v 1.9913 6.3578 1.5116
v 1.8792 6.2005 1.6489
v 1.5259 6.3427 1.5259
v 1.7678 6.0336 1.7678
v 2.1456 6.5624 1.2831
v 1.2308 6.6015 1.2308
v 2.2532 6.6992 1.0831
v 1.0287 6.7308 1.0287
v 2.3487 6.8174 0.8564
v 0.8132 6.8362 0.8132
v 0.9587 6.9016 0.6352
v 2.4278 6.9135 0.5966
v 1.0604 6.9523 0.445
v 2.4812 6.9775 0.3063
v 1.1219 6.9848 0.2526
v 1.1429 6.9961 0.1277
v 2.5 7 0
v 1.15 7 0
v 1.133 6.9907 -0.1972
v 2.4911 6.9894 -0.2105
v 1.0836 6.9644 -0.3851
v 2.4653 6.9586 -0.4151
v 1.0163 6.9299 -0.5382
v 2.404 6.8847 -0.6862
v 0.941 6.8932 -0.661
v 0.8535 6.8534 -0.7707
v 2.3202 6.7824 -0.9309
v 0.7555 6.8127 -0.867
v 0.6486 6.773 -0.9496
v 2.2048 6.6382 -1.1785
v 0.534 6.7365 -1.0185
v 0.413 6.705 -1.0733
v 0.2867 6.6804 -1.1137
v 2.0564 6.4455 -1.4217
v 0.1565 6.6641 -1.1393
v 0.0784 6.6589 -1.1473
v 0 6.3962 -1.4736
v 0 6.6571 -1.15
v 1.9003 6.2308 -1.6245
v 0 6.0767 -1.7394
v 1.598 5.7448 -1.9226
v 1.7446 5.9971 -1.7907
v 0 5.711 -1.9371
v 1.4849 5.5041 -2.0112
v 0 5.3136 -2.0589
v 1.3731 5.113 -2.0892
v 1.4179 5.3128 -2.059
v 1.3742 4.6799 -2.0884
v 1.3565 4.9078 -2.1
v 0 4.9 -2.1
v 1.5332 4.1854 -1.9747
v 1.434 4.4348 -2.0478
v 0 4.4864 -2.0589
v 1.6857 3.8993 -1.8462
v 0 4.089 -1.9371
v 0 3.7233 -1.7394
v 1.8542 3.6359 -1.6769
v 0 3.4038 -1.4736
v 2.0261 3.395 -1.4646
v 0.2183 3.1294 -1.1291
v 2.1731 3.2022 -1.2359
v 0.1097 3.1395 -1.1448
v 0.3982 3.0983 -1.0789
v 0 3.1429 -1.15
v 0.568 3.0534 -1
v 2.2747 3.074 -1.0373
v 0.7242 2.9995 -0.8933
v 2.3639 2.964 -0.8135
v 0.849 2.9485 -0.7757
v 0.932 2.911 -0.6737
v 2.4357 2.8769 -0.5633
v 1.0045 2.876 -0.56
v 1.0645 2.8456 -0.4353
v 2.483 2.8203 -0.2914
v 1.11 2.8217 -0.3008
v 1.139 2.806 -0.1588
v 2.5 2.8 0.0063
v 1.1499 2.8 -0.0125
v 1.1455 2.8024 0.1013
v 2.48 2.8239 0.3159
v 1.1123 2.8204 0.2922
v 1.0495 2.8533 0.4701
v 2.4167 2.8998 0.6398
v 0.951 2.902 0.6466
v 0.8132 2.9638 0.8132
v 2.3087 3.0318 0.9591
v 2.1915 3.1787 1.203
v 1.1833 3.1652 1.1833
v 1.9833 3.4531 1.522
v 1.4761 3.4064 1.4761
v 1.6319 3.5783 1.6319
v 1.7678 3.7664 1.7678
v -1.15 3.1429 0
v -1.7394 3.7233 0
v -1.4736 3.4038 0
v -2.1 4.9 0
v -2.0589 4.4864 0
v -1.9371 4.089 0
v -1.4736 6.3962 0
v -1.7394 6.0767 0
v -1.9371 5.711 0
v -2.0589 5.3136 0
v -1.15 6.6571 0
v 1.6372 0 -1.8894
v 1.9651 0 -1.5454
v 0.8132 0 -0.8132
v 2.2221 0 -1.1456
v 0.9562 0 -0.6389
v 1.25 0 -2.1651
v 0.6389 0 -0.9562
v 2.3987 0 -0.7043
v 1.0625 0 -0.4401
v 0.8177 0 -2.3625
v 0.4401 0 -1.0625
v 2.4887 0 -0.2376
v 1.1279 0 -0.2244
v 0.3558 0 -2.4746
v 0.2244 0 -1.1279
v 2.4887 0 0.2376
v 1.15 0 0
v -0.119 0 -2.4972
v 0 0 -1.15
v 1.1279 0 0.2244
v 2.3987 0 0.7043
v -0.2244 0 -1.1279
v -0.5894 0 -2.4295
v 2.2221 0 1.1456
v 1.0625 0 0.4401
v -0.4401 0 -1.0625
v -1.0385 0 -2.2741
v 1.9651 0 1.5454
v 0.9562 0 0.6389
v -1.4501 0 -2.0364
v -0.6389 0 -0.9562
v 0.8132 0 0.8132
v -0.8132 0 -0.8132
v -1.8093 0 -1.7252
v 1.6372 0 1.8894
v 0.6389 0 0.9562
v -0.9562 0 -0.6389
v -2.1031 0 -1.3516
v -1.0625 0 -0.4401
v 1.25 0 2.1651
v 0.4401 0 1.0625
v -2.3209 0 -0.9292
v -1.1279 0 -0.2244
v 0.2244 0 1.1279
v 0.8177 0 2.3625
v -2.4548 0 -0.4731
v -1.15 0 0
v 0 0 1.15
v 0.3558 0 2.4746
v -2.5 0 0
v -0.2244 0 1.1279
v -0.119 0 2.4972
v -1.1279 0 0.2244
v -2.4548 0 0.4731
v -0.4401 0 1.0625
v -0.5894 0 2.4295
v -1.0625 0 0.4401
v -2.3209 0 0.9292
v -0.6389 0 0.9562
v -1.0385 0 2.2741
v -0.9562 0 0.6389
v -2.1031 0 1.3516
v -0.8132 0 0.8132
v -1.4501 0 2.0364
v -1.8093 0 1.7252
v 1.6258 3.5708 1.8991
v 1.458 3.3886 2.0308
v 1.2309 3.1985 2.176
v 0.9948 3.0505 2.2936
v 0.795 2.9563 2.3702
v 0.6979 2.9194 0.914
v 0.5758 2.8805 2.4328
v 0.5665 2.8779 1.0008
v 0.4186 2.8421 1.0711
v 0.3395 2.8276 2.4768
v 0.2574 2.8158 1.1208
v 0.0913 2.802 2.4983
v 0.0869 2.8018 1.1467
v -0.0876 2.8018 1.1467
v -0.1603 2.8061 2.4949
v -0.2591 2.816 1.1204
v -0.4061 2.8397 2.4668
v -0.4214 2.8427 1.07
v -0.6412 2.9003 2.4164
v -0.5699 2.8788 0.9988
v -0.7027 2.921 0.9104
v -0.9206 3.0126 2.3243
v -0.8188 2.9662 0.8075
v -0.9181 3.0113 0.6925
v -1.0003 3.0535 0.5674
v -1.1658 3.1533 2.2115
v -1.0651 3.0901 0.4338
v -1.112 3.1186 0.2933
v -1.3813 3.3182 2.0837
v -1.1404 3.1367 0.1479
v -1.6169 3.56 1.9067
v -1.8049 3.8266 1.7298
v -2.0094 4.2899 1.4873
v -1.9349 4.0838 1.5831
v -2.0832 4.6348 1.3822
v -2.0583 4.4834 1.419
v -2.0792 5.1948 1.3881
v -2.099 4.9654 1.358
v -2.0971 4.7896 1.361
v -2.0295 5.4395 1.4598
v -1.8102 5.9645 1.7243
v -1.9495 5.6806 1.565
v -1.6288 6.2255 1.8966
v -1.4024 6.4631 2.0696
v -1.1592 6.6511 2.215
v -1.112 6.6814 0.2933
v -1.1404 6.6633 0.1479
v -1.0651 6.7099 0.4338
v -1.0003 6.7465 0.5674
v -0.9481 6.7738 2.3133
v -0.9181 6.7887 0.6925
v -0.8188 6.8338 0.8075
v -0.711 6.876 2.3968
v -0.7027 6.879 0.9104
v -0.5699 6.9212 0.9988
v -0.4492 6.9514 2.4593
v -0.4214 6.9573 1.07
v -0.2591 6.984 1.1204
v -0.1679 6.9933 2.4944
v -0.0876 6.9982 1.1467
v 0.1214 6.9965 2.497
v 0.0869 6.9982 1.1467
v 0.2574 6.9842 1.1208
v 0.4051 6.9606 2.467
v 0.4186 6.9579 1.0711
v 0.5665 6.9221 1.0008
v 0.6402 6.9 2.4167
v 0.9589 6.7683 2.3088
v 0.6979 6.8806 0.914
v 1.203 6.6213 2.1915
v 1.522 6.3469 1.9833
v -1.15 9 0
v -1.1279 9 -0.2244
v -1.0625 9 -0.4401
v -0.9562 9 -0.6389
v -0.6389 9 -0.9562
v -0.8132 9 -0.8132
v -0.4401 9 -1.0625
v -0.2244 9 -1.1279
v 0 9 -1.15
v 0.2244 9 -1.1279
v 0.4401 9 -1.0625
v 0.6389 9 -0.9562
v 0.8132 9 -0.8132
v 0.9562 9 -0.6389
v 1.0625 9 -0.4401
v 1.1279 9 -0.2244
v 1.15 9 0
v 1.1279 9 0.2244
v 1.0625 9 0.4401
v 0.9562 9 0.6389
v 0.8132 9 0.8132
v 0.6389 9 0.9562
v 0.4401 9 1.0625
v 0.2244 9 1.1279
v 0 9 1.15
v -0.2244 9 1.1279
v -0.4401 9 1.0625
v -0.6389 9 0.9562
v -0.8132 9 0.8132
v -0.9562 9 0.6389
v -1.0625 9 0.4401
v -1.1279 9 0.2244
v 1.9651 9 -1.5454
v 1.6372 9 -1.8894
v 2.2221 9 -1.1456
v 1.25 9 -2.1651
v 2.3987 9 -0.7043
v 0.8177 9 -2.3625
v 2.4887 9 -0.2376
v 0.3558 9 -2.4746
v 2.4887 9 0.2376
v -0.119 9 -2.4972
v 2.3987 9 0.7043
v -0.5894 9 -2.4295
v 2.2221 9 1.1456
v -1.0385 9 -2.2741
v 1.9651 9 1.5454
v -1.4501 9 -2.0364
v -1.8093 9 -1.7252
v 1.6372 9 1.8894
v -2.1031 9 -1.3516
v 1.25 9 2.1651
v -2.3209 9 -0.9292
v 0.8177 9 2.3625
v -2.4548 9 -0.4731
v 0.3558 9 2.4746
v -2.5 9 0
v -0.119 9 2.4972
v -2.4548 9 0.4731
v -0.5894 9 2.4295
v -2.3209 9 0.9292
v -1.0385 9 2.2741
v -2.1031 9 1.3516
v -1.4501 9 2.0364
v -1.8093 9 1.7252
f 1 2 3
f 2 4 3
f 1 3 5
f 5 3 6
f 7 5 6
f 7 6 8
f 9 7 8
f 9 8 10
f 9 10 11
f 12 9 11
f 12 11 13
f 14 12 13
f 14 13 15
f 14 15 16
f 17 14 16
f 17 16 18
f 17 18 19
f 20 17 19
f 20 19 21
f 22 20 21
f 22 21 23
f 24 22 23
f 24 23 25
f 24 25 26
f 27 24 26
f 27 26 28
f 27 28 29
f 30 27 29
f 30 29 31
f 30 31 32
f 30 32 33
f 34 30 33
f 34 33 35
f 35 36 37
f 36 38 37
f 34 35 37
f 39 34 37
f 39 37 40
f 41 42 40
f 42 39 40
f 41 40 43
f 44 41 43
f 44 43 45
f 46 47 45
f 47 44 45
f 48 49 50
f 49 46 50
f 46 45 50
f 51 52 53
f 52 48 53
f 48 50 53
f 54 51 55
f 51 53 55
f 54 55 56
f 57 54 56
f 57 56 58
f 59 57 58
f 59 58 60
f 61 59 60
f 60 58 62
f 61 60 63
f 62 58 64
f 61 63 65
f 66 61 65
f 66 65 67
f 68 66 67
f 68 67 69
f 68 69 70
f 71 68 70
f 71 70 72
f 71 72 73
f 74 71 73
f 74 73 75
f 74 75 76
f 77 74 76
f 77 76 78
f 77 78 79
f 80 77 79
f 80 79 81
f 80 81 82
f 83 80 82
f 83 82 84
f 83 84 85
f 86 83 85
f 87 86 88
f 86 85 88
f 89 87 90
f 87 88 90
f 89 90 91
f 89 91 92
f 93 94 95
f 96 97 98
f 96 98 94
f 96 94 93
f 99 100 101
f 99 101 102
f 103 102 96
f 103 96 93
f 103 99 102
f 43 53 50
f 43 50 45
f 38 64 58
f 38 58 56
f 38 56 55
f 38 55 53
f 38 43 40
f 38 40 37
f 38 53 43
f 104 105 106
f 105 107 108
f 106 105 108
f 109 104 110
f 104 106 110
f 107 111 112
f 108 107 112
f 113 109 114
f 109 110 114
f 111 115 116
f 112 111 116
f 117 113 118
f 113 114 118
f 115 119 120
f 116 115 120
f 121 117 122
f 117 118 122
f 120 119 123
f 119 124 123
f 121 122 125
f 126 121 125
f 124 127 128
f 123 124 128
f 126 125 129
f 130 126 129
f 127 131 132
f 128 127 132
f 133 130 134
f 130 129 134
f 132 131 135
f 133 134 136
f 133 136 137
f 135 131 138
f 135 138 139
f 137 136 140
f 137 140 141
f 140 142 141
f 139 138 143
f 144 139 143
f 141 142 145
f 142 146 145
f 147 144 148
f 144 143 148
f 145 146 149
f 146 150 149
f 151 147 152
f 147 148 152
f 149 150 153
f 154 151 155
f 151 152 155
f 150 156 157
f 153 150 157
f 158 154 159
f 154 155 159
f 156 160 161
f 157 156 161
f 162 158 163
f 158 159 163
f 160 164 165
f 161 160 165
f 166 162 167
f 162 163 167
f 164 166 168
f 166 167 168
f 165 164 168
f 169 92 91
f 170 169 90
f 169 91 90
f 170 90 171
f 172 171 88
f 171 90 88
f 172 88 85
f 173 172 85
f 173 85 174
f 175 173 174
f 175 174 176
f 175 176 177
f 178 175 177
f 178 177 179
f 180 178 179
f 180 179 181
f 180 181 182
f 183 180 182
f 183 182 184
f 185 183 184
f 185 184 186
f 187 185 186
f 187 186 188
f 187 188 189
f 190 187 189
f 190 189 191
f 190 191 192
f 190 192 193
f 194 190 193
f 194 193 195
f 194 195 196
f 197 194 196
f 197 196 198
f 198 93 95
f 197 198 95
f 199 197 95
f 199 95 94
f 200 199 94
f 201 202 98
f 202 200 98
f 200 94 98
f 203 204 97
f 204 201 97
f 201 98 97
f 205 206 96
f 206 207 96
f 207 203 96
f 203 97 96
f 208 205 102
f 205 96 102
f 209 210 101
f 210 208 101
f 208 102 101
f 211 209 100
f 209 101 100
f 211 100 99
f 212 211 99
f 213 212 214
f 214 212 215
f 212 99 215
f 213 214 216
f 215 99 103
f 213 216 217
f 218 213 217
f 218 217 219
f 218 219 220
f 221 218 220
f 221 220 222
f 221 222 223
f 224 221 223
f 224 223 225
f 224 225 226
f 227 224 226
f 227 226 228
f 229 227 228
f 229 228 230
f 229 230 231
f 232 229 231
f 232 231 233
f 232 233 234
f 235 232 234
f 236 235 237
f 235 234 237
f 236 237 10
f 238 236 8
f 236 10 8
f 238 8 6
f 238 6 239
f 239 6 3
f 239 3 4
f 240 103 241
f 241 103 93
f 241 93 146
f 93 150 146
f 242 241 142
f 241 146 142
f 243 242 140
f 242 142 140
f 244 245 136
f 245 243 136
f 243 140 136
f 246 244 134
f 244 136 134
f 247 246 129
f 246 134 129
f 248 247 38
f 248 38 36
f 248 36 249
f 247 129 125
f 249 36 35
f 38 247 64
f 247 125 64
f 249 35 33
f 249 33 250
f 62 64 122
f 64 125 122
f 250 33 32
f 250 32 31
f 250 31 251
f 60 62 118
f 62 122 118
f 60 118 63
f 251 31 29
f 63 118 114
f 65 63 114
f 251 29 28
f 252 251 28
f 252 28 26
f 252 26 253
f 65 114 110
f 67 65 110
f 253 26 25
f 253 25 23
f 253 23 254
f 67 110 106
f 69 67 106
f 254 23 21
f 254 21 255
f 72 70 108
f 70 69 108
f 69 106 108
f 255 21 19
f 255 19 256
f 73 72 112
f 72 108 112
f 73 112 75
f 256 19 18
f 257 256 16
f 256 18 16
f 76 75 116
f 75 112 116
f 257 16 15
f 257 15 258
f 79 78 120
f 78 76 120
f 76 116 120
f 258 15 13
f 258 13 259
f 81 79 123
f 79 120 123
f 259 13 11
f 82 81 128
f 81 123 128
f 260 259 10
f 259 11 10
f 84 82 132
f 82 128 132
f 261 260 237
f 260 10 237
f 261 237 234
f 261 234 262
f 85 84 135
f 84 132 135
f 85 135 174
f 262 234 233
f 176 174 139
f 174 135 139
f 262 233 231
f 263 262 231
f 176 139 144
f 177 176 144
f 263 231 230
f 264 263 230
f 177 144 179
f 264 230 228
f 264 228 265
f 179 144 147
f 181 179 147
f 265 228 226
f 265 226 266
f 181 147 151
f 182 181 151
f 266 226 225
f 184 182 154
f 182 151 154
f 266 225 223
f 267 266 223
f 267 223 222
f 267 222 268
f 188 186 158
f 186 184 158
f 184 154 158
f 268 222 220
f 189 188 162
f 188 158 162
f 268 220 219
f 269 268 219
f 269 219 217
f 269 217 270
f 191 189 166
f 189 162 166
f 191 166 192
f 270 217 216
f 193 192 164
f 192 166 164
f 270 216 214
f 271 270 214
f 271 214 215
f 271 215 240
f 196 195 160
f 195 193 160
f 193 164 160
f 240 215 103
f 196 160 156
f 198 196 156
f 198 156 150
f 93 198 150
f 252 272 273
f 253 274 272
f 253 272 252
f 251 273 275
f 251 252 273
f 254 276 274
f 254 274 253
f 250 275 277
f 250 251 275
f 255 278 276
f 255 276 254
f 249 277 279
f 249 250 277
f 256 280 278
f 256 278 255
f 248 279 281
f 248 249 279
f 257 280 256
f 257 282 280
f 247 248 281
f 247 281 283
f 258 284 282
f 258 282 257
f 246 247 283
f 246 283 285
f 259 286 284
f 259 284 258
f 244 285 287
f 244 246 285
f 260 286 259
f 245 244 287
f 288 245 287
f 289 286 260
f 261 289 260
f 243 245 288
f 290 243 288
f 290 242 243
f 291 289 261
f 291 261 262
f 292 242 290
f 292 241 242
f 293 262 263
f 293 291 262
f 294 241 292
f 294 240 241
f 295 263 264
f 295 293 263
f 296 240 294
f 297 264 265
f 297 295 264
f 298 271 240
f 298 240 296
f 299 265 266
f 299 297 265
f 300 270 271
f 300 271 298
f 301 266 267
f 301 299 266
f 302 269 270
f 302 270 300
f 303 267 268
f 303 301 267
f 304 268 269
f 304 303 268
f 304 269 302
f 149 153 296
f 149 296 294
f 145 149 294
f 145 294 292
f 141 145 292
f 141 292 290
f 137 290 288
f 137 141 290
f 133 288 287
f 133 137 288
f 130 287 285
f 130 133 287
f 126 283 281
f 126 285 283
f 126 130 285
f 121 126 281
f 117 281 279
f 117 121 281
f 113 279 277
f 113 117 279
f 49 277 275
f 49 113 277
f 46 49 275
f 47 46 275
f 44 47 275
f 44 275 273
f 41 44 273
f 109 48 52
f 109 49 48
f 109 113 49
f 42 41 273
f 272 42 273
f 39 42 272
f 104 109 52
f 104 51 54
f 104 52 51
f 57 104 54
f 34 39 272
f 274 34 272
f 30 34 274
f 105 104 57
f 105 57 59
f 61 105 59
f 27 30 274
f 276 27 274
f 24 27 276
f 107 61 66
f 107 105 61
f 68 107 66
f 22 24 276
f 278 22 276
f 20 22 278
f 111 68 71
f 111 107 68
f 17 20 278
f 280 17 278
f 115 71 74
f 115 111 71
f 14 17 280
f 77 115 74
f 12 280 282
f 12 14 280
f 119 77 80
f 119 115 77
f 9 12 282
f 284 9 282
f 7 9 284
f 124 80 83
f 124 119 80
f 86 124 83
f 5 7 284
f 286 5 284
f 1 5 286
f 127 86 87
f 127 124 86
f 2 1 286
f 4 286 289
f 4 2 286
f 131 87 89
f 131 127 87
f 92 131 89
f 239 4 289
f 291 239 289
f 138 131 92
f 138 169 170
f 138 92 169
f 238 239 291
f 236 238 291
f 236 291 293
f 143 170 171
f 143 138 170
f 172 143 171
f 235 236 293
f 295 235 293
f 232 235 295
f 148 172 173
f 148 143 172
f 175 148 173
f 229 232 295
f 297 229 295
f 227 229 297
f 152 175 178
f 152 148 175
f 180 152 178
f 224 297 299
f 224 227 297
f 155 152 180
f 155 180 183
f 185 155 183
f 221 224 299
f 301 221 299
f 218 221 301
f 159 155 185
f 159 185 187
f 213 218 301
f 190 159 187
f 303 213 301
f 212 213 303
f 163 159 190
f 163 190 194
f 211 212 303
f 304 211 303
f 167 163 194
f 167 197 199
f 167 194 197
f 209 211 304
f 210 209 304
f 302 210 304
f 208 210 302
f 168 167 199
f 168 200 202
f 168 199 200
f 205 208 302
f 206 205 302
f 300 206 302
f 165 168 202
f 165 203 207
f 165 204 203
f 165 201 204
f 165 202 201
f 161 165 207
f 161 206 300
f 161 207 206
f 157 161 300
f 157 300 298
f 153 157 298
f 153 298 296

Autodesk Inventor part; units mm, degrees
ref_plane "YZ Plane" through (0, 0, 0) normal (1, 0, 0) x (0, 1, 0)
ref_plane "XZ Plane" through (0, 0, 0) normal (0, 1, 0) x (-1, 0, 0)
ref_plane "XY Plane" through (0, 0, 0) normal (0, 0, 1) x (1, 0, 0)
sketch "Sketch1" plane through (0, 0, 0) normal (0, 1, 0) x (-1, 0, 0)
  circle A0 centre (0, 0) radius 1.15
  circle A1 centre (0, 0) radius 2.5
  dimension "d0" = 2.3
  dimension "d1" = 5
extrude "Extrusion1" add sketch "Sketch1" along normal blind 9
sketch "Sketch2" plane through (0, 0, 0) normal (0, 0, 1) x (1, 0, 0)
  line L0 (2.5, 9) -> (-2.5, 9) projected
  line L1 (2.5, 0) -> (-2.5, 0) projected
  line L2 (-2.5, 0) -> (-2.5, 9) projected
  line L3 (-2.5, 7) -> (2.5173, 7)
  line L4 (2.5, 9) -> (-2.5, 9) projected
  line L5 (0, 9) -> (0, 0)
  circle A0 centre (0, 4.9) radius 2.1
  dimension "d4" = 2
  dimension "d5" = 4.2
extrude "Extrusion2" cut sketch "Sketch2" along normal blind 12 contours A0 L5 | L5 A0
sketch "Sketch3" plane through (0, 0, 0) normal (1, 0, 0) x (0, 1, 0)
  line L0 (9, -2.5) -> (9, 2.5) projected
  line L1 (0, -2.5) -> (0, 2.5) projected
  line L2 (0, 2.5) -> (9, 2.5) projected
  line L3 (7, 2.5) -> (7, -2.525)
  line L4 (9, 1.15) -> (9, -1.15) projected
  line L5 (9, 0) -> (0, 0)
  circle A0 centre (4.9, 0) radius 2.1
  point P0 (4.9, 1.3565)
  dimension "d8" = 2
  dimension "d9" = 4.2
extrude "Extrusion3" cut sketch "Sketch3" along normal up to next contours A0 L5 | L5 A0
properties part number "motor_shaft_adapter" material "ABS Plastic"
